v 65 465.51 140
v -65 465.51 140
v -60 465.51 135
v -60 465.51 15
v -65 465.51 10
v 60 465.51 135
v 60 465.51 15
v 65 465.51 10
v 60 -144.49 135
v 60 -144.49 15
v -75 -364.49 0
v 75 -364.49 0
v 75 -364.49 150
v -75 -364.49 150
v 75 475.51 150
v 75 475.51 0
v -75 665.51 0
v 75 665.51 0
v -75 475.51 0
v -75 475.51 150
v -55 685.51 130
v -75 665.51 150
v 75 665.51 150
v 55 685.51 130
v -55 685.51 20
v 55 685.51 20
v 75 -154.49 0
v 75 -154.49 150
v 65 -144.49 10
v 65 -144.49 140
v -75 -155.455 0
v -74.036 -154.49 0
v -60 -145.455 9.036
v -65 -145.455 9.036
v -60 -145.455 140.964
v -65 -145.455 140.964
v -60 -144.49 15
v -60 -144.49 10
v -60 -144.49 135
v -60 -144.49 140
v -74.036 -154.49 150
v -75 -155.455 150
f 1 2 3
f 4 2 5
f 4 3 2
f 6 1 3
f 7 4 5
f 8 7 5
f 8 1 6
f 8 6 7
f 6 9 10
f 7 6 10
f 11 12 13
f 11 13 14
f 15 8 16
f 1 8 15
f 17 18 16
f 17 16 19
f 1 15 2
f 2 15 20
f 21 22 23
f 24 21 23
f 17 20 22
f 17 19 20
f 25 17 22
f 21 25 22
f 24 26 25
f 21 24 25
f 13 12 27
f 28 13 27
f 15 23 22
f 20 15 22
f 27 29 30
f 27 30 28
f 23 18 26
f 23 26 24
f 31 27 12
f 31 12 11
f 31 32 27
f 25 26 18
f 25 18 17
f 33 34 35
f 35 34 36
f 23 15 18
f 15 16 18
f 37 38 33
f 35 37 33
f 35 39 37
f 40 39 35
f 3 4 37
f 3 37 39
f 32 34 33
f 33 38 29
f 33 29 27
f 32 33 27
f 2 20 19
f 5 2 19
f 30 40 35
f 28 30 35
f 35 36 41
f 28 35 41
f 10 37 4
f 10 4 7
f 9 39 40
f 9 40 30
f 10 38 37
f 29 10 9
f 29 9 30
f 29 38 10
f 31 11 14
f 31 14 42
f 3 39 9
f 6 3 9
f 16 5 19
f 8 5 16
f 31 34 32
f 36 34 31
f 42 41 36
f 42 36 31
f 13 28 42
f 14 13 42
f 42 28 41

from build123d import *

# Parameters (mm, degrees)
ESQUISSE1_W             = 75
ESQUISSE1_H             = 1050
BOSS_EXTRU_2_DEPTH      = 150
ESQUISSE2_W             = 226.933426854
ESQUISSE2_H             = 610
ENL_V_MAT_EXTRU_1_DEPTH = 15
ESQUISSE3_W             = 179.782352086
ESQUISSE3_H             = 610.96446809
ENL_V_MAT_EXTRU_2_DEPTH = 15
ESQUISSE4_W             = 199.341724475
ESQUISSE4_H             = 610
ENL_V_MAT_EXTRU_3_DEPTH = 15
ESQUISSE5_W             = 150
ESQUISSE5_H             = 610
ENL_V_MAT_EXTRU_4_DEPTH = 15
CHANFREIN1_SIZE         = 20
CHANFREIN2_SIZE         = 10
CHANFREIN3_SIZE         = 10


with BuildPart() as part:
    # Esquisse1 → Boss.-Extru.2 (new body)
    with BuildSketch(Plane.XY):
        with Locations((-37.5, 160.509714461)):
            Rectangle(ESQUISSE1_W, ESQUISSE1_H)
    boss_extru_2 = extrude(amount=BOSS_EXTRU_2_DEPTH)

    # Symétrie1: Boss.-Extru.2 across plane
    add(boss_extru_2.mirror(Plane(origin=(0, 685.509714461, 150), x_dir=(0, 0, 1), z_dir=(-1, 0, 0))))

    # Esquisse2 → Enlèv. mat.-Extru.1 (cut)
    with BuildSketch(Plane.XY):
        with Locations((0, 160.509714461)):
            Rectangle(ESQUISSE2_W, ESQUISSE2_H)
    extrude(amount=ENL_V_MAT_EXTRU_1_DEPTH, mode=Mode.SUBTRACT)

    # Esquisse3 → Enlèv. mat.-Extru.2 (cut)
    with BuildSketch(Plane.ZY.offset(75)):
        with Locations((89.891176043, 160.027480416)):
            Rectangle(ESQUISSE3_W, ESQUISSE3_H)
    extrude(amount=-ENL_V_MAT_EXTRU_2_DEPTH, mode=Mode.SUBTRACT)

    # Esquisse4 → Enlèv. mat.-Extru.3 (cut)
    with BuildSketch(Plane(origin=(75, 0, 0), x_dir=(0, 0, -1), z_dir=(1, 0, 0))):
        with Locations((-99.670862238, 160.509714461)):
            Rectangle(ESQUISSE4_W, ESQUISSE4_H)
    extrude(amount=-ENL_V_MAT_EXTRU_3_DEPTH, mode=Mode.SUBTRACT)

    # Esquisse5 → Enlèv. mat.-Extru.4 (cut)
    with BuildSketch(Plane.XY.offset(150)):
        with Locations((0, 160.509714461)):
            Rectangle(ESQUISSE5_W, ESQUISSE5_H)
    extrude(amount=-ENL_V_MAT_EXTRU_4_DEPTH, mode=Mode.SUBTRACT)

    # Chanfrein1
    chanfrein1_edges = [part.edges().sort_by_distance(p)[0] for p in [
        (75, 685.509714461, 75),
        (0, 685.509714461, 0),
        (0, 685.509714461, 150),
        (-75, 685.509714461, 75),
    ]]
    chamfer(chanfrein1_edges, length=CHANFREIN1_SIZE)

    # Chanfrein2
    chanfrein2_edges = [part.edges().sort_by_distance(p)[0] for p in [
        (75, 465.509714461, 75),
        (0, 465.509714461, 0),
        (-75, 465.509714461, 75),
        (0, 465.509714461, 150),
    ]]
    chamfer(chanfrein2_edges, length=CHANFREIN2_SIZE)

    # Chanfrein3
    # the kernel refuses this chamfer: 10 mm, written as the material it takes off along each edge
    with BuildSketch(Plane(origin=(-75, -145.454753629, 175.71682988), x_dir=(0.9996219169112968, 0.0274958766105877, 0), z_dir=(0, 0, -1))) as chanfrein3_piece_1:
        Polygon((CHANFREIN3_SIZE * 0.999621916911, CHANFREIN3_SIZE * 0.0274958766106), (-CHANFREIN3_SIZE * 0.0274958766106, CHANFREIN3_SIZE * 0.999621916911), (0, 0), align=None)
    extrude(amount=201.433659759, mode=Mode.SUBTRACT)
    with BuildSketch(Plane(origin=(-85.71682988, -144.490285539, 150), x_dir=(0, 0.027495876610587663, -0.9996219169112968), z_dir=(1, 0, 0)), Plane(origin=(100.71682988, -144.490285539, 0), x_dir=(0, 0.0274958766105877, 0.9996219169112968), z_dir=(-1, 0, 0))) as chanfrein3_piece_2:
        Polygon((CHANFREIN3_SIZE * 0.999621916911, -CHANFREIN3_SIZE * 0.0274958766106), (-CHANFREIN3_SIZE * 0.0274958766106, -CHANFREIN3_SIZE * 0.999621916911), (0, 0), align=None)
    extrude(amount=186.433659759, mode=Mode.SUBTRACT)
    with BuildSketch(Plane(origin=(75, -144.490285539, 175.71682988), x_dir=(-0.9996219169112968, 0.0274958766105877, 0), z_dir=(0, 0, -1))) as chanfrein3_piece_3:
        Polygon((CHANFREIN3_SIZE * 0.999621916911, -CHANFREIN3_SIZE * 0.0274958766106), (-CHANFREIN3_SIZE * 0.0274958766106, -CHANFREIN3_SIZE * 0.999621916911), (0, 0), align=None)
    extrude(amount=201.433659759, mode=Mode.SUBTRACT)


solid = part.part
